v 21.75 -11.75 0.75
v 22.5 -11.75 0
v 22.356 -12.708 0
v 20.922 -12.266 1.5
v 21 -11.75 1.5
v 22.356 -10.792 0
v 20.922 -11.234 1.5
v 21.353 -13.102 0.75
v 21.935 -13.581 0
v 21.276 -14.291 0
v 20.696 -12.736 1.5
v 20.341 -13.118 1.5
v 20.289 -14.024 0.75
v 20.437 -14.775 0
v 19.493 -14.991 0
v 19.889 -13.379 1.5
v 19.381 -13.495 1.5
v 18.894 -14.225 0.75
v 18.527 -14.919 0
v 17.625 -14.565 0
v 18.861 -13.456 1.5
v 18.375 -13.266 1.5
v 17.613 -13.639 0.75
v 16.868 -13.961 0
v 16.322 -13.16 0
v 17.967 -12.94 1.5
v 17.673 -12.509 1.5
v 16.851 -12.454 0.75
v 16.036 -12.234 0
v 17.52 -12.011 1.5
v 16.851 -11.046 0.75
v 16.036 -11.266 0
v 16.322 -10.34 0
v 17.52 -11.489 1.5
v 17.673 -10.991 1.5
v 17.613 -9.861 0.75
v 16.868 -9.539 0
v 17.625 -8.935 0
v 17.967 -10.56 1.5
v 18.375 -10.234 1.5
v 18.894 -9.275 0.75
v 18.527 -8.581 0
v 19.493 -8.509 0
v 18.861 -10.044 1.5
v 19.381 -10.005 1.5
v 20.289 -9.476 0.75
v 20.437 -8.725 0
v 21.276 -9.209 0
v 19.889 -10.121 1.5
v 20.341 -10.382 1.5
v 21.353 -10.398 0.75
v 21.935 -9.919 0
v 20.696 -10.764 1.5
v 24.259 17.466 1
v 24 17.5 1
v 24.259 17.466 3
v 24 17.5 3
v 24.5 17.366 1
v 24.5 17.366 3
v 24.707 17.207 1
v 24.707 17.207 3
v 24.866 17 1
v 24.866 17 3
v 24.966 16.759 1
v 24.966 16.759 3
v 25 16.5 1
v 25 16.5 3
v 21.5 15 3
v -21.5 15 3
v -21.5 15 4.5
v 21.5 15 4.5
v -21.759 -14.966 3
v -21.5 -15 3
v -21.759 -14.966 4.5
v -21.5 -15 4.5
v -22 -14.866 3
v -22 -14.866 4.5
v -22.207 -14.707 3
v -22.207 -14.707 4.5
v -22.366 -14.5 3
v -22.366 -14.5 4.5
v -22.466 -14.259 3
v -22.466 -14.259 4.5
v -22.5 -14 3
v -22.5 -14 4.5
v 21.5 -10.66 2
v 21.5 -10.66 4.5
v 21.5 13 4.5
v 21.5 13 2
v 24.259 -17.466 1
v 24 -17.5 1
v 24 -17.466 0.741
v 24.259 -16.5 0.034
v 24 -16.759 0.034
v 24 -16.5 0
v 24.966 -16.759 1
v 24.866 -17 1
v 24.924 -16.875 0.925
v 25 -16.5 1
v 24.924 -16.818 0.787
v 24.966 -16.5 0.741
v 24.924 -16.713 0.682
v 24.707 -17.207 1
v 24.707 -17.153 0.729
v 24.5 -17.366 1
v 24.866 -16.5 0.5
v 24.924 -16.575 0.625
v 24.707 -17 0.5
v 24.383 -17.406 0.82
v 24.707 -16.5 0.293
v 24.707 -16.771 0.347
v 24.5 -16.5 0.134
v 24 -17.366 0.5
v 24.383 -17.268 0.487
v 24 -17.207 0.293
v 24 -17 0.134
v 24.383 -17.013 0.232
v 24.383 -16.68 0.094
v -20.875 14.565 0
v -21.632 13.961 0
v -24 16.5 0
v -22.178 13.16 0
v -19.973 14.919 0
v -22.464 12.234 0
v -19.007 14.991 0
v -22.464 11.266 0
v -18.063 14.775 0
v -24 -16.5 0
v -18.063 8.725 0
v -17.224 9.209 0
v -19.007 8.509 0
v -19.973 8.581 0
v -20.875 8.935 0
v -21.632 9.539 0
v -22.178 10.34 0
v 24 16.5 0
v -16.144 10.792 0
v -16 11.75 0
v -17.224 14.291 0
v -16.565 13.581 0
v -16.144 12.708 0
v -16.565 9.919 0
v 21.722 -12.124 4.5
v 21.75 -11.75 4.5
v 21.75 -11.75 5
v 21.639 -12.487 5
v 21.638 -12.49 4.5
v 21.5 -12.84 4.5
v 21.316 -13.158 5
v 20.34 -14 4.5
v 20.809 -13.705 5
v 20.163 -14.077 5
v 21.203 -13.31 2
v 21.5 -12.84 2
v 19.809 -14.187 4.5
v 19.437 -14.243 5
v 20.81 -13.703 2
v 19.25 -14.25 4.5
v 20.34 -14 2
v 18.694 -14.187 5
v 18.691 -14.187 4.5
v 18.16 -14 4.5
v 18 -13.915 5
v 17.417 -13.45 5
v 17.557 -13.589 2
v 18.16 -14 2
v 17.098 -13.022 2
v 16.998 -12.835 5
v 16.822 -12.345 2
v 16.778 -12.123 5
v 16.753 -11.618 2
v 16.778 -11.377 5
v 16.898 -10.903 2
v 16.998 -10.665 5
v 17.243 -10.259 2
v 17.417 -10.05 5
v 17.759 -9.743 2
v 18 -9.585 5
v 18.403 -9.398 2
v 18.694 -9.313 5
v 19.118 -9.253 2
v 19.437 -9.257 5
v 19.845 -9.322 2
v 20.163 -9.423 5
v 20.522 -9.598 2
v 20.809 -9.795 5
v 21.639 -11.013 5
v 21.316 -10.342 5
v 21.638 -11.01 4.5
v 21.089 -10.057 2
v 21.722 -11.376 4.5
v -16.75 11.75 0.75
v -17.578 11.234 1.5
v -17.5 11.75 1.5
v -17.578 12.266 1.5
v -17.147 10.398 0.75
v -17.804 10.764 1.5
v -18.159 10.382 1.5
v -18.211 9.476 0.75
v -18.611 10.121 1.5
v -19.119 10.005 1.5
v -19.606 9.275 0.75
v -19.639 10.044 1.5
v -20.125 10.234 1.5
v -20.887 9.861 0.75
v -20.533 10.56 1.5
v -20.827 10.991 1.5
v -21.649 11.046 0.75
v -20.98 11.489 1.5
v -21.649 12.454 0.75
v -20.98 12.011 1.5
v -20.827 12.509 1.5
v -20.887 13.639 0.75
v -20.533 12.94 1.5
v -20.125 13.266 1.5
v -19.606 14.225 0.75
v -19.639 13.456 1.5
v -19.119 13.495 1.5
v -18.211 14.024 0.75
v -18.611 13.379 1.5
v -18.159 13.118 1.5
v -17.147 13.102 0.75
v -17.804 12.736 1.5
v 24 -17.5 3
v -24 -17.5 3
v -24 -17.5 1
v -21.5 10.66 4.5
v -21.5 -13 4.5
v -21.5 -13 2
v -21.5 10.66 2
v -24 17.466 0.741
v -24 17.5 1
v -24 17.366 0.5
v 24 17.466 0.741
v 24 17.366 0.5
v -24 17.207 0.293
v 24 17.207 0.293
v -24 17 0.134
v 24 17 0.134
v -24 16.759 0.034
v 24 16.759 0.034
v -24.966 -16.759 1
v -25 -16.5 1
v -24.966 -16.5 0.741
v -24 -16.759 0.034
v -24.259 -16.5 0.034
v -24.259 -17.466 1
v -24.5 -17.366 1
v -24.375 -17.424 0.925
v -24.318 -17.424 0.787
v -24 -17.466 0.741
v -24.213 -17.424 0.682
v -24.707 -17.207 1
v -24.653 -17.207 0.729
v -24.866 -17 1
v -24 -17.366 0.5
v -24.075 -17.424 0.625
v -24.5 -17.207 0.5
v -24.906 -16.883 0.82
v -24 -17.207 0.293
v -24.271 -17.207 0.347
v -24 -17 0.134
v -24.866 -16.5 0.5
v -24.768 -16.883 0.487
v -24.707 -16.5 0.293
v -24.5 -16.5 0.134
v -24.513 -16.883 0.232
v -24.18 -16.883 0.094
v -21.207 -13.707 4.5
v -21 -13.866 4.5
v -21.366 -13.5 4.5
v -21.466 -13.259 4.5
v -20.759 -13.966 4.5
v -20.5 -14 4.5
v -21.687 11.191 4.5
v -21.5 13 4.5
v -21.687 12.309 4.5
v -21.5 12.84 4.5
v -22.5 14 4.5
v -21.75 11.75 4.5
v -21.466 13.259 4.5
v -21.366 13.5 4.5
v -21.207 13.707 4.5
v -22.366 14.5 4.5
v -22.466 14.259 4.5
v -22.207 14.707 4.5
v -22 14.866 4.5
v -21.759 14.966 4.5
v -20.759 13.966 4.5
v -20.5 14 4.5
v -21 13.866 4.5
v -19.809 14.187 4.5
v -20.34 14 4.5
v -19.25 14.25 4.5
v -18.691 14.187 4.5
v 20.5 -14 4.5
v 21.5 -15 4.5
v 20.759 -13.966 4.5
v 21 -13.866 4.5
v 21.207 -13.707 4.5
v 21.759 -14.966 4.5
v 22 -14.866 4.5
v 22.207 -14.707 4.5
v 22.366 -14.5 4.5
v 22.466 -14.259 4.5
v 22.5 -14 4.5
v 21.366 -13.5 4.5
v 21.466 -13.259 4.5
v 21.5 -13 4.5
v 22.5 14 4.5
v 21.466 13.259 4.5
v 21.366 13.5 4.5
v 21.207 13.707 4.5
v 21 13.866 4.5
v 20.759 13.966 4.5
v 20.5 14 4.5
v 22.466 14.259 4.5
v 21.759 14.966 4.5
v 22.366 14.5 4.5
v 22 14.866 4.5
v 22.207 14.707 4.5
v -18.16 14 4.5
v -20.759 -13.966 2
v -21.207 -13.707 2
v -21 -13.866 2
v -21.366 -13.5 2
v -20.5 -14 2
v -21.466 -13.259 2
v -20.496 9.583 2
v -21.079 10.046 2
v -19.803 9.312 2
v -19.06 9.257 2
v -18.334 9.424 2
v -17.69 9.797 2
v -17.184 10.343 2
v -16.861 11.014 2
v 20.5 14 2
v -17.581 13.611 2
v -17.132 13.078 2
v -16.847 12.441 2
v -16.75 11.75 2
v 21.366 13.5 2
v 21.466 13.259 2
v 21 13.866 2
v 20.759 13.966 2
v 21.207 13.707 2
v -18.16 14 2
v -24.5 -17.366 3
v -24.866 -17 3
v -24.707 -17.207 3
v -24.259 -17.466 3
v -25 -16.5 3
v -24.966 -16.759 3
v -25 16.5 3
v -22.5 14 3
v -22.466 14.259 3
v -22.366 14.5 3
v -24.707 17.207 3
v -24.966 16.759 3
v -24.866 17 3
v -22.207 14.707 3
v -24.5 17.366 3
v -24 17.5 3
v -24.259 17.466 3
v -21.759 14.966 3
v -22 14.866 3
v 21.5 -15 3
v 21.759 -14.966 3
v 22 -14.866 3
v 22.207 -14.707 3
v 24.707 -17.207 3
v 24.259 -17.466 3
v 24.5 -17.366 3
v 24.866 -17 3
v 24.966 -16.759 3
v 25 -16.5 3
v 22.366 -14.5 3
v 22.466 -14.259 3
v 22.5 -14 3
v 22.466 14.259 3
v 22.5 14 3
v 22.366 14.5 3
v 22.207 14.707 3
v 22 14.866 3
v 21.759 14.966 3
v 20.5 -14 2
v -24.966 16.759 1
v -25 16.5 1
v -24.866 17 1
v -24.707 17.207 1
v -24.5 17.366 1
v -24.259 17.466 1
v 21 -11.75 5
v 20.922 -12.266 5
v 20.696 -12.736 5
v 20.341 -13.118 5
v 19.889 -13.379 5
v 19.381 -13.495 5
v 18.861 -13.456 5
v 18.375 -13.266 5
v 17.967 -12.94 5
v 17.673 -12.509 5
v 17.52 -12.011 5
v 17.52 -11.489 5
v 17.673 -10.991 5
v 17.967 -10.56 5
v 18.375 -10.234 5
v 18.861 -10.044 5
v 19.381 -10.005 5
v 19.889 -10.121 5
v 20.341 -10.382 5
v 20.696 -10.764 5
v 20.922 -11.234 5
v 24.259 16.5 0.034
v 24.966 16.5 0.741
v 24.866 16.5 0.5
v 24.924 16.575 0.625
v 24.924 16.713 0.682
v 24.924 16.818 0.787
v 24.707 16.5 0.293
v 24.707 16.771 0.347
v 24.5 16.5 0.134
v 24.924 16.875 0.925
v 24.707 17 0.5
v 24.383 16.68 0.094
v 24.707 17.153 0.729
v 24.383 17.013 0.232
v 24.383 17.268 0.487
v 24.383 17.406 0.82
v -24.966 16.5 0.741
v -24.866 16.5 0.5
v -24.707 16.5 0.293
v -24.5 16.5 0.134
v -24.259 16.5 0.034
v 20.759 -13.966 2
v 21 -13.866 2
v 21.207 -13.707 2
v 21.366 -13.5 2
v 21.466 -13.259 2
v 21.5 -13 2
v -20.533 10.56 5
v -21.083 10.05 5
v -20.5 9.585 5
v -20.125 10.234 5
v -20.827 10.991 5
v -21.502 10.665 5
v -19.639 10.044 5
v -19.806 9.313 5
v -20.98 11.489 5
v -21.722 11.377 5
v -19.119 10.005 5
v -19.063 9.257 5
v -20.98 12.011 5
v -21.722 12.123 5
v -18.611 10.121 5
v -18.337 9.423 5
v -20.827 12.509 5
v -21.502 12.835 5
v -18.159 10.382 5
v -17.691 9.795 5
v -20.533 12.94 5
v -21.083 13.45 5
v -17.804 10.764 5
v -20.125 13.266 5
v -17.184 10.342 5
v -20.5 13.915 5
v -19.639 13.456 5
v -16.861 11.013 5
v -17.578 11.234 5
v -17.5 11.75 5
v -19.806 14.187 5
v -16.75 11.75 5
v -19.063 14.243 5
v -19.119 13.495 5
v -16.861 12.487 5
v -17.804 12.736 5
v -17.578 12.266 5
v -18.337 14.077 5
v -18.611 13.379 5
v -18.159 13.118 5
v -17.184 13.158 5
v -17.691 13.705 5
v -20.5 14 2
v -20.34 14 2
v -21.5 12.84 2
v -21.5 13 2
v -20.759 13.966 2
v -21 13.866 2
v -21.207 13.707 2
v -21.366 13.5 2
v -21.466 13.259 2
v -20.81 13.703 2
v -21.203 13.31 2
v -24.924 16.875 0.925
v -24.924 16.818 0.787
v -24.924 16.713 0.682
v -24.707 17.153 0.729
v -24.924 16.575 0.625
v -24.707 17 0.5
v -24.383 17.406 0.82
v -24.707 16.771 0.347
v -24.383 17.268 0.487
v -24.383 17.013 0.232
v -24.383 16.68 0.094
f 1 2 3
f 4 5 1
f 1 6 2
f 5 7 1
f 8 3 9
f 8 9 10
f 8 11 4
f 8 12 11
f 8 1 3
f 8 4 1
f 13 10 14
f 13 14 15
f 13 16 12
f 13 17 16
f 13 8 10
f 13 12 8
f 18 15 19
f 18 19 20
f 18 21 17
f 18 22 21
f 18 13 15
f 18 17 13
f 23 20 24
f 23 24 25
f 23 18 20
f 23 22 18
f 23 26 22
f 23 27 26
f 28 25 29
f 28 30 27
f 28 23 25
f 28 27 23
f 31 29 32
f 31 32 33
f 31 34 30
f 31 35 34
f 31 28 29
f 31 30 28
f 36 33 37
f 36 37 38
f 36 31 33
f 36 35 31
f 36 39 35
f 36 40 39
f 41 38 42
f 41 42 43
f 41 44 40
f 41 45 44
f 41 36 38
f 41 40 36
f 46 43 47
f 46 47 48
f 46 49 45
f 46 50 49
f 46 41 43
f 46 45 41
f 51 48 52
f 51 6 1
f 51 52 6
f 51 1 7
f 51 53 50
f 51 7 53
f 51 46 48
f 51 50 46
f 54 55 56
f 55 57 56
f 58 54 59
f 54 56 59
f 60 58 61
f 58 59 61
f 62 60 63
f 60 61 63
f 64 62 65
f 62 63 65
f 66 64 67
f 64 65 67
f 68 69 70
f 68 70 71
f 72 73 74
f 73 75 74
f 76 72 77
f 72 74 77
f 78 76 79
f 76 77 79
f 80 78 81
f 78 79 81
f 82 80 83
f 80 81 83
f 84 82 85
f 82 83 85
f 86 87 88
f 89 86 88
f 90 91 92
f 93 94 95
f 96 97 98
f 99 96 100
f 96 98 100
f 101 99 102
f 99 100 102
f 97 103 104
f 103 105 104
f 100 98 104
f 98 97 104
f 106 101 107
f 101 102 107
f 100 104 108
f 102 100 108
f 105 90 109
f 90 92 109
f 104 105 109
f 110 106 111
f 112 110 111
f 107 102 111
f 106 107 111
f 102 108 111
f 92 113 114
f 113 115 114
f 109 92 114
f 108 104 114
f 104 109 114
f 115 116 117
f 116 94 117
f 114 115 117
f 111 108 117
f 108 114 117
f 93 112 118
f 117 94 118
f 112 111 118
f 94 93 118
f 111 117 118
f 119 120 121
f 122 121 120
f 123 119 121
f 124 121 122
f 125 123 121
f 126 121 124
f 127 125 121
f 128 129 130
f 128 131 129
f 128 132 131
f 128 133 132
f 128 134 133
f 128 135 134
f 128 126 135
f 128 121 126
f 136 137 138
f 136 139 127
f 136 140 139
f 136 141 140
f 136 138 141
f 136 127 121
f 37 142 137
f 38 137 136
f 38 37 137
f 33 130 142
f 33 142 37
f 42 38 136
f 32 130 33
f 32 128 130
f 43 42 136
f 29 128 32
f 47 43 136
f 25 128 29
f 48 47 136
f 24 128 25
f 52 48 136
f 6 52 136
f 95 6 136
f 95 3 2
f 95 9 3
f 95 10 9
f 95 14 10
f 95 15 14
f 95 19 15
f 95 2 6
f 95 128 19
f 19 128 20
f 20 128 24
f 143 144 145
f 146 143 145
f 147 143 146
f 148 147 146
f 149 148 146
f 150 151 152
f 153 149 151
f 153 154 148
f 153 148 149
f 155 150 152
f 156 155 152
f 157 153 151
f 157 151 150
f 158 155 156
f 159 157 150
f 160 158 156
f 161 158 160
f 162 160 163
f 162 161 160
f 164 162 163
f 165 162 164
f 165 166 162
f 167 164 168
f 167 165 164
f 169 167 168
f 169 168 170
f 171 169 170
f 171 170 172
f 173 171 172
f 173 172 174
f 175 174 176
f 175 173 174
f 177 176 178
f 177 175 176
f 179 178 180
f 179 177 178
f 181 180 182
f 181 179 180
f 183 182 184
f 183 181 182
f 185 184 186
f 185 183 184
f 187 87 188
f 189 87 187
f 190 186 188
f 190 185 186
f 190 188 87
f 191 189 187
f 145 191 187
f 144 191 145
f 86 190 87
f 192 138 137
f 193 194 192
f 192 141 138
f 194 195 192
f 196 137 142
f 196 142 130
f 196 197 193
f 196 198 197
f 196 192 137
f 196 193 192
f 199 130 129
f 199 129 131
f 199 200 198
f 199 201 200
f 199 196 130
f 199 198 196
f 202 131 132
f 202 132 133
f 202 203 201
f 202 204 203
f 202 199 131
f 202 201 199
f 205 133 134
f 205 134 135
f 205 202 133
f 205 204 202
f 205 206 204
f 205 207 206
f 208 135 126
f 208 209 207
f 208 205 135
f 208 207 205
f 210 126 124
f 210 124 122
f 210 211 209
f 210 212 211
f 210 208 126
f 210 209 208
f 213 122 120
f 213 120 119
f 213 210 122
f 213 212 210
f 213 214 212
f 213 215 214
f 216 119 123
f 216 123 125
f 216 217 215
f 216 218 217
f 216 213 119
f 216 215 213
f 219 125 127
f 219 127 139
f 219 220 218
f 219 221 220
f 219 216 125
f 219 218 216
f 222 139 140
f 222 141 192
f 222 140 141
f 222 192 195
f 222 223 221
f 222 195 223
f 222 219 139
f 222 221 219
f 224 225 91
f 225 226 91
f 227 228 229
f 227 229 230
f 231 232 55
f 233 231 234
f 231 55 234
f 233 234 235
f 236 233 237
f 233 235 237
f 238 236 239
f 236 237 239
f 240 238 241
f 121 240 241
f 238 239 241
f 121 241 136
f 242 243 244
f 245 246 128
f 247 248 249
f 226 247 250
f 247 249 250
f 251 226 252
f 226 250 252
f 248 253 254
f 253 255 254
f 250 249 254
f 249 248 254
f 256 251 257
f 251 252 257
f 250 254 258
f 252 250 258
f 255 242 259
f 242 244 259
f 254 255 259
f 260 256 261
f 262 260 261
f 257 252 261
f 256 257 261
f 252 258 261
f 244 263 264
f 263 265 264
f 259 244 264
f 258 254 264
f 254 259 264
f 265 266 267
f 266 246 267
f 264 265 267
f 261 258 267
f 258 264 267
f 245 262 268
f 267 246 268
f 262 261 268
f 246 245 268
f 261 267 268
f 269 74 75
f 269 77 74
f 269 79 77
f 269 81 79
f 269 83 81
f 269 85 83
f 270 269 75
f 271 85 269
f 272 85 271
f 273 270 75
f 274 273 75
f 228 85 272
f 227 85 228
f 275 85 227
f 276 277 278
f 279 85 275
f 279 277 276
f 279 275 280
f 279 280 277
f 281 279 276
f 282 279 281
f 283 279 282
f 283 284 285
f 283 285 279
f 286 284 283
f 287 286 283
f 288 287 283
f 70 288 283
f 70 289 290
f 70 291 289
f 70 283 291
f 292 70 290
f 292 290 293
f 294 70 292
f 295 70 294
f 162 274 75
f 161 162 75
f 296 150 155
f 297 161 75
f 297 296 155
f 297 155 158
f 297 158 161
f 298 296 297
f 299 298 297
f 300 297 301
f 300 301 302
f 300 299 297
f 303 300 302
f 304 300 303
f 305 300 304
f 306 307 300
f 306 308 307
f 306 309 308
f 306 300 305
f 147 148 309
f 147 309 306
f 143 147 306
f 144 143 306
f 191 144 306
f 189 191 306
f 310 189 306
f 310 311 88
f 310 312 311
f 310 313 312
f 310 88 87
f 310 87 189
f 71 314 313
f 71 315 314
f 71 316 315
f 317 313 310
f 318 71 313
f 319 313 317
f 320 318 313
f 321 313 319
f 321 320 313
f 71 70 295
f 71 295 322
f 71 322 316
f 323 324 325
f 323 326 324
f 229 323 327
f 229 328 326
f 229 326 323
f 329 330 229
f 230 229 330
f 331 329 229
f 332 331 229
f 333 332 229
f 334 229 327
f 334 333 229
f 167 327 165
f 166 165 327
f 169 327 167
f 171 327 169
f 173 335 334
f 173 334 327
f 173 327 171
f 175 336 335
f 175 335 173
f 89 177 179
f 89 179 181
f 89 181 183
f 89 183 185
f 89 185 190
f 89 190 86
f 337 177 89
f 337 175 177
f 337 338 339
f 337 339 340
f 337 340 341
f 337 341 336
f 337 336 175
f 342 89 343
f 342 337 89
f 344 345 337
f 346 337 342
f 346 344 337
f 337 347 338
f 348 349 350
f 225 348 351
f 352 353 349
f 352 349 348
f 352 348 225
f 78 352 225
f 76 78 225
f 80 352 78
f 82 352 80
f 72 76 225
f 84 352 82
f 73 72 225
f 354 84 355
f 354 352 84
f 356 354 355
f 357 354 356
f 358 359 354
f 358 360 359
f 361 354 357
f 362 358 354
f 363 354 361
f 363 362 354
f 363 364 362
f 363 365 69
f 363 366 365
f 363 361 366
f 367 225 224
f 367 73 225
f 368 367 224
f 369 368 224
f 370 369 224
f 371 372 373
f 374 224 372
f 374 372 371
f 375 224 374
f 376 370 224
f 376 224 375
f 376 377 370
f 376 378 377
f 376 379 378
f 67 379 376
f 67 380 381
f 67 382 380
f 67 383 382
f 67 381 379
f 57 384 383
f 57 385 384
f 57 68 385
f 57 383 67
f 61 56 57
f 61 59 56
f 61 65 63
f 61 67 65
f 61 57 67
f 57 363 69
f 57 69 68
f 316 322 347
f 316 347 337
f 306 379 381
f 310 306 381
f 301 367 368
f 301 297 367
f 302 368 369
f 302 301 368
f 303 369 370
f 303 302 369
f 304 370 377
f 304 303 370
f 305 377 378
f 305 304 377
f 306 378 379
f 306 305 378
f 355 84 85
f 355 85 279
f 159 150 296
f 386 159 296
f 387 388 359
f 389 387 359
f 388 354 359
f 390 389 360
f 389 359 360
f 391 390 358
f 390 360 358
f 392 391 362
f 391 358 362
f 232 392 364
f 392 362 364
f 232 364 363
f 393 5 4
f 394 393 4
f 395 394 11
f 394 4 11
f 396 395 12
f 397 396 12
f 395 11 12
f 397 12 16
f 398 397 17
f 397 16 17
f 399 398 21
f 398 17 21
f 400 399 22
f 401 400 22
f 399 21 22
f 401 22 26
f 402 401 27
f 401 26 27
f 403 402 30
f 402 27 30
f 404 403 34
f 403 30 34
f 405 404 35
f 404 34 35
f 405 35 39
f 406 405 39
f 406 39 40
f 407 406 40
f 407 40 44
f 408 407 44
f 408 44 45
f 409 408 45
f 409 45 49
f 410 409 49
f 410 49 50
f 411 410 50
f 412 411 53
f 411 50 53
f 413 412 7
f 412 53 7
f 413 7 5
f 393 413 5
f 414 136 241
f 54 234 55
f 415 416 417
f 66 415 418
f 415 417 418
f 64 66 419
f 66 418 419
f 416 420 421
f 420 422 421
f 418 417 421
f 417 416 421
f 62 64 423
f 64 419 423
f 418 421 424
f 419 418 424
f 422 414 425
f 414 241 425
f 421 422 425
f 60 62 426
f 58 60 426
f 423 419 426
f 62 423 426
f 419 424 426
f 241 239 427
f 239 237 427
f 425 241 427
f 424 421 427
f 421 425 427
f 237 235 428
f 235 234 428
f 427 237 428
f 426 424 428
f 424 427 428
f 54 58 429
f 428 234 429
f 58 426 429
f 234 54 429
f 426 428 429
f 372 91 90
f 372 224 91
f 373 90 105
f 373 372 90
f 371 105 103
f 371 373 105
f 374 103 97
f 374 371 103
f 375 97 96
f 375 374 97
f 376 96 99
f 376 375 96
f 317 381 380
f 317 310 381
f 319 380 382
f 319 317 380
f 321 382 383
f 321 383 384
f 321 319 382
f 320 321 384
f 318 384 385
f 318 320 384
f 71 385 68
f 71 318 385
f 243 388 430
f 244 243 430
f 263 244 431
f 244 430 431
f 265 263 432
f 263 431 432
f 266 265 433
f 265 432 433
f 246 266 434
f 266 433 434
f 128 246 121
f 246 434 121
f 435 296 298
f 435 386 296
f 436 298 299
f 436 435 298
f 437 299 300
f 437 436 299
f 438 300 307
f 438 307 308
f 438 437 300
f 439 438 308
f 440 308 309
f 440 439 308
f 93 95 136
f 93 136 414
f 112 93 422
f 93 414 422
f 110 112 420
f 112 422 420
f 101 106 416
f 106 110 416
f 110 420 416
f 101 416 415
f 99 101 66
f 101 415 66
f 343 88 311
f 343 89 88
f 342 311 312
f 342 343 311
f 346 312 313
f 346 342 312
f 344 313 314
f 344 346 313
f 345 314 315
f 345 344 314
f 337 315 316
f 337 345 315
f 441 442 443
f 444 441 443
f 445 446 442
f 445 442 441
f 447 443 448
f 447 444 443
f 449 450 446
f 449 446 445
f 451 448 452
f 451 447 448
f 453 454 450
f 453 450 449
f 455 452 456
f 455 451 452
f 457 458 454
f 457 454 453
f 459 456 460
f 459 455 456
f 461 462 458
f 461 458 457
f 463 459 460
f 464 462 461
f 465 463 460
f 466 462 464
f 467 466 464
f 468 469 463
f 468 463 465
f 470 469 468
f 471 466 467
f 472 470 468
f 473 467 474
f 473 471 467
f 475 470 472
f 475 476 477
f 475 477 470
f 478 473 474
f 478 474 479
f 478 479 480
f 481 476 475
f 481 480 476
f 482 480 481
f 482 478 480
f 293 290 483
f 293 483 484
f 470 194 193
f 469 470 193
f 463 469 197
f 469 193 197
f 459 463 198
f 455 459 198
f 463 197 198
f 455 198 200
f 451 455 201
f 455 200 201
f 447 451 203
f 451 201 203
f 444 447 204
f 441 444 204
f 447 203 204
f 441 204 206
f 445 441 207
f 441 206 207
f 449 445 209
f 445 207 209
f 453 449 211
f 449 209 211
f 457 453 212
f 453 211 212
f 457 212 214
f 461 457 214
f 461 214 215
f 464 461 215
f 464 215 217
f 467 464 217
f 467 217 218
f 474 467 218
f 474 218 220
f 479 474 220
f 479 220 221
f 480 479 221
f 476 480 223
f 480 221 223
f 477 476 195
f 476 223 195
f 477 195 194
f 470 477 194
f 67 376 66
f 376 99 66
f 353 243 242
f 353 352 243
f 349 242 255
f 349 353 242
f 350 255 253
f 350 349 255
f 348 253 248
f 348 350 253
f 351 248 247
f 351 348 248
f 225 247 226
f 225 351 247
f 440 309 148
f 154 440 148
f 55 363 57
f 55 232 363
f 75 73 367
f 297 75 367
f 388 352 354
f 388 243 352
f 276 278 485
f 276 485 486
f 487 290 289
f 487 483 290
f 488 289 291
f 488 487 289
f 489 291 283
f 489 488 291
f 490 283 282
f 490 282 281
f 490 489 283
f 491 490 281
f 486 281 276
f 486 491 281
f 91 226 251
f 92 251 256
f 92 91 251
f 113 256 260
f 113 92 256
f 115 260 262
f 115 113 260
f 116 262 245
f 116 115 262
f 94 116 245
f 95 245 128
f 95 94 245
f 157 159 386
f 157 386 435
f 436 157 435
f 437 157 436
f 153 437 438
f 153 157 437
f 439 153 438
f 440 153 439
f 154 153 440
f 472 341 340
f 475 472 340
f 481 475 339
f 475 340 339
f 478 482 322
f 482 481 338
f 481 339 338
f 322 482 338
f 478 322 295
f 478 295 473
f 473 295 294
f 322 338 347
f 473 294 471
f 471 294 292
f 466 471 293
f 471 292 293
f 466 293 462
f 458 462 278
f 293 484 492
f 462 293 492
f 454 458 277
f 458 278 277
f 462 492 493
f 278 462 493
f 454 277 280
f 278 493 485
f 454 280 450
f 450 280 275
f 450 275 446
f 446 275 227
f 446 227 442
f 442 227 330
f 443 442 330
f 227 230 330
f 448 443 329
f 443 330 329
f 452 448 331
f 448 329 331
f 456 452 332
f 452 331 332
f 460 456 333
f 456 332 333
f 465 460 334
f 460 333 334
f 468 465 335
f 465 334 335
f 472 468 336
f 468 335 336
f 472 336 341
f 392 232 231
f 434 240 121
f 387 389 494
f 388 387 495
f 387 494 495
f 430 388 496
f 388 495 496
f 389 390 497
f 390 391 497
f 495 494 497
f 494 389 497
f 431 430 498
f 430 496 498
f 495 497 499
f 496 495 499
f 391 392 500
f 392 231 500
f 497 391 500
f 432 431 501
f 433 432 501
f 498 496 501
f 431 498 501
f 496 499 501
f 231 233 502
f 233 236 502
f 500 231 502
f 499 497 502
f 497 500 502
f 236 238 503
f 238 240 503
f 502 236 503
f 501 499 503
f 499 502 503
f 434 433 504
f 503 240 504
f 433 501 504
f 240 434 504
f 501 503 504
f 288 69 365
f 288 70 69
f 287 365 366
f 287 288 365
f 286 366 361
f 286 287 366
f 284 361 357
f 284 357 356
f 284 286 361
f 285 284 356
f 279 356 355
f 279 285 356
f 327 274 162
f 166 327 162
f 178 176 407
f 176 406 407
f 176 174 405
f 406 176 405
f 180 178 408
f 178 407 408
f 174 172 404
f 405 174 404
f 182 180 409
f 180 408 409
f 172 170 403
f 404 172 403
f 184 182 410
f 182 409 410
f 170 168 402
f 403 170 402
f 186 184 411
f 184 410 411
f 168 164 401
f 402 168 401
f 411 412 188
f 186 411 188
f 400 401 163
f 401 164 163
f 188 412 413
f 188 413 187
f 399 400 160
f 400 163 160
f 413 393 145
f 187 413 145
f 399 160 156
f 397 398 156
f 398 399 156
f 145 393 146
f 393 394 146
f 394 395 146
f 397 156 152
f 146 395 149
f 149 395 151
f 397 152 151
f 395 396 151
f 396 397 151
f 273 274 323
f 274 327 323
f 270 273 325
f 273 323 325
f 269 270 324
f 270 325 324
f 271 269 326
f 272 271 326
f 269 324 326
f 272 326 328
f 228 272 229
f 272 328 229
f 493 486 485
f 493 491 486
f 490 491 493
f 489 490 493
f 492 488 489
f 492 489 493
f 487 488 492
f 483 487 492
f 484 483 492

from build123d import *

# Parameters (mm, degrees)
SKETCH_W        = 50
SKETCH_H        = 35
PAD_DEPTH       = 3
SKETCH002_W     = 45
SKETCH002_H     = 30
PAD001_DEPTH    = 1.5
SKETCH003_W     = 43
SKETCH003_H     = 28
POCKET001_DEPTH = 2.5
FILLET_R        = 1
FILLET001_R     = 1
SKETCH005_R     = 2.5
PAD002_DEPTH    = 5
SKETCH004_R     = 2.5
PAD003_DEPTH    = 5
SKETCH006_R     = 1.75
POCKET_DEPTH    = 5
SKETCH007_R     = 1.75
POCKET002_DEPTH = 5
CHAMFER_SIZE    = 1.5
CHAMFER001_SIZE = 1.5


with BuildPart() as part:
    # Sketch → Pad (new body)
    with BuildSketch(Plane.XY):
        Rectangle(SKETCH_W, SKETCH_H)
    extrude(amount=PAD_DEPTH)

    # Sketch002 → Pad001 (join)
    with BuildSketch(Plane.XY.offset(3)):
        Rectangle(SKETCH002_W, SKETCH002_H)
    extrude(amount=PAD001_DEPTH)

    # Sketch003 (on Face11 of Pad001) → Pocket001 (cut)
    with BuildSketch(Plane.XY.offset(4.5)):
        Rectangle(SKETCH003_W, SKETCH003_H)
    extrude(amount=-POCKET001_DEPTH, mode=Mode.SUBTRACT)

    # Fillet
    fillet_edges = [part.edges().sort_by_distance(p)[0] for p in [
        (0, 17.5, 0),
        (-25, 17.5, 1.5),
        (-25, 0, 0),
        (-25, -17.5, 1.5),
        (0, -17.5, 0),
        (25, -17.5, 1.5),
        (25, 0, 0),
        (25, 17.5, 1.5),
    ]]
    fillet(fillet_edges, radius=FILLET_R)

    # Fillet001
    fillet001_edges = [part.edges().sort_by_distance(p)[0] for p in [
        (-21.5, -14, 3.25),
        (22.5, -15, 3.75),
        (22.5, 15, 3.75),
        (-22.5, 15, 3.75),
        (-22.5, -15, 3.75),
        (21.5, 14, 3.25),
        (-21.5, 14, 3.25),
        (21.5, -14, 3.25),
    ]]
    fillet(fillet001_edges, radius=FILLET001_R)

    # Sketch005 → Pad002 (join)
    with BuildSketch(Plane.XY):
        with Locations((-19.25, 11.75)):
            Circle(SKETCH005_R)
    extrude(amount=PAD002_DEPTH)

    # Sketch004 (on Face35 of Fillet001) → Pad003 (join)
    with BuildSketch(Plane(origin=(0, 0, 0), x_dir=(1, 0, 0), z_dir=(0, 0, -1))):
        with Locations((19.25, 11.75)):
            Circle(SKETCH004_R)
    extrude(amount=-PAD003_DEPTH)

    # Sketch006 (on Face48 of Pad003) → Pocket (cut)
    with BuildSketch(Plane(origin=(0, 0, 0), x_dir=(1, 0, 0), z_dir=(0, 0, -1))):
        with Locations((-19.25, -11.75)):
            Circle(SKETCH006_R)
    extrude(amount=-POCKET_DEPTH, mode=Mode.SUBTRACT)

    # Sketch007 (on Face48 of Pocket) → Pocket002 (cut)
    with BuildSketch(Plane(origin=(0, 0, 0), x_dir=(1, 0, 0), z_dir=(0, 0, -1))):
        with Locations((19.25, 11.75)):
            Circle(SKETCH007_R)
    extrude(amount=-POCKET002_DEPTH, mode=Mode.SUBTRACT)

    # Chamfer
    chamfer_edges = [part.edges().sort_by_distance(p)[0] for p in [
        (-21, 11.75, 0),
    ]]
    chamfer(chamfer_edges, length=CHAMFER_SIZE)

    # Chamfer001
    chamfer001_edges = [part.edges().sort_by_distance(p)[0] for p in [
        (17.5, -11.75, 0),
    ]]
    chamfer(chamfer001_edges, length=CHAMFER001_SIZE)


solid = part.part
